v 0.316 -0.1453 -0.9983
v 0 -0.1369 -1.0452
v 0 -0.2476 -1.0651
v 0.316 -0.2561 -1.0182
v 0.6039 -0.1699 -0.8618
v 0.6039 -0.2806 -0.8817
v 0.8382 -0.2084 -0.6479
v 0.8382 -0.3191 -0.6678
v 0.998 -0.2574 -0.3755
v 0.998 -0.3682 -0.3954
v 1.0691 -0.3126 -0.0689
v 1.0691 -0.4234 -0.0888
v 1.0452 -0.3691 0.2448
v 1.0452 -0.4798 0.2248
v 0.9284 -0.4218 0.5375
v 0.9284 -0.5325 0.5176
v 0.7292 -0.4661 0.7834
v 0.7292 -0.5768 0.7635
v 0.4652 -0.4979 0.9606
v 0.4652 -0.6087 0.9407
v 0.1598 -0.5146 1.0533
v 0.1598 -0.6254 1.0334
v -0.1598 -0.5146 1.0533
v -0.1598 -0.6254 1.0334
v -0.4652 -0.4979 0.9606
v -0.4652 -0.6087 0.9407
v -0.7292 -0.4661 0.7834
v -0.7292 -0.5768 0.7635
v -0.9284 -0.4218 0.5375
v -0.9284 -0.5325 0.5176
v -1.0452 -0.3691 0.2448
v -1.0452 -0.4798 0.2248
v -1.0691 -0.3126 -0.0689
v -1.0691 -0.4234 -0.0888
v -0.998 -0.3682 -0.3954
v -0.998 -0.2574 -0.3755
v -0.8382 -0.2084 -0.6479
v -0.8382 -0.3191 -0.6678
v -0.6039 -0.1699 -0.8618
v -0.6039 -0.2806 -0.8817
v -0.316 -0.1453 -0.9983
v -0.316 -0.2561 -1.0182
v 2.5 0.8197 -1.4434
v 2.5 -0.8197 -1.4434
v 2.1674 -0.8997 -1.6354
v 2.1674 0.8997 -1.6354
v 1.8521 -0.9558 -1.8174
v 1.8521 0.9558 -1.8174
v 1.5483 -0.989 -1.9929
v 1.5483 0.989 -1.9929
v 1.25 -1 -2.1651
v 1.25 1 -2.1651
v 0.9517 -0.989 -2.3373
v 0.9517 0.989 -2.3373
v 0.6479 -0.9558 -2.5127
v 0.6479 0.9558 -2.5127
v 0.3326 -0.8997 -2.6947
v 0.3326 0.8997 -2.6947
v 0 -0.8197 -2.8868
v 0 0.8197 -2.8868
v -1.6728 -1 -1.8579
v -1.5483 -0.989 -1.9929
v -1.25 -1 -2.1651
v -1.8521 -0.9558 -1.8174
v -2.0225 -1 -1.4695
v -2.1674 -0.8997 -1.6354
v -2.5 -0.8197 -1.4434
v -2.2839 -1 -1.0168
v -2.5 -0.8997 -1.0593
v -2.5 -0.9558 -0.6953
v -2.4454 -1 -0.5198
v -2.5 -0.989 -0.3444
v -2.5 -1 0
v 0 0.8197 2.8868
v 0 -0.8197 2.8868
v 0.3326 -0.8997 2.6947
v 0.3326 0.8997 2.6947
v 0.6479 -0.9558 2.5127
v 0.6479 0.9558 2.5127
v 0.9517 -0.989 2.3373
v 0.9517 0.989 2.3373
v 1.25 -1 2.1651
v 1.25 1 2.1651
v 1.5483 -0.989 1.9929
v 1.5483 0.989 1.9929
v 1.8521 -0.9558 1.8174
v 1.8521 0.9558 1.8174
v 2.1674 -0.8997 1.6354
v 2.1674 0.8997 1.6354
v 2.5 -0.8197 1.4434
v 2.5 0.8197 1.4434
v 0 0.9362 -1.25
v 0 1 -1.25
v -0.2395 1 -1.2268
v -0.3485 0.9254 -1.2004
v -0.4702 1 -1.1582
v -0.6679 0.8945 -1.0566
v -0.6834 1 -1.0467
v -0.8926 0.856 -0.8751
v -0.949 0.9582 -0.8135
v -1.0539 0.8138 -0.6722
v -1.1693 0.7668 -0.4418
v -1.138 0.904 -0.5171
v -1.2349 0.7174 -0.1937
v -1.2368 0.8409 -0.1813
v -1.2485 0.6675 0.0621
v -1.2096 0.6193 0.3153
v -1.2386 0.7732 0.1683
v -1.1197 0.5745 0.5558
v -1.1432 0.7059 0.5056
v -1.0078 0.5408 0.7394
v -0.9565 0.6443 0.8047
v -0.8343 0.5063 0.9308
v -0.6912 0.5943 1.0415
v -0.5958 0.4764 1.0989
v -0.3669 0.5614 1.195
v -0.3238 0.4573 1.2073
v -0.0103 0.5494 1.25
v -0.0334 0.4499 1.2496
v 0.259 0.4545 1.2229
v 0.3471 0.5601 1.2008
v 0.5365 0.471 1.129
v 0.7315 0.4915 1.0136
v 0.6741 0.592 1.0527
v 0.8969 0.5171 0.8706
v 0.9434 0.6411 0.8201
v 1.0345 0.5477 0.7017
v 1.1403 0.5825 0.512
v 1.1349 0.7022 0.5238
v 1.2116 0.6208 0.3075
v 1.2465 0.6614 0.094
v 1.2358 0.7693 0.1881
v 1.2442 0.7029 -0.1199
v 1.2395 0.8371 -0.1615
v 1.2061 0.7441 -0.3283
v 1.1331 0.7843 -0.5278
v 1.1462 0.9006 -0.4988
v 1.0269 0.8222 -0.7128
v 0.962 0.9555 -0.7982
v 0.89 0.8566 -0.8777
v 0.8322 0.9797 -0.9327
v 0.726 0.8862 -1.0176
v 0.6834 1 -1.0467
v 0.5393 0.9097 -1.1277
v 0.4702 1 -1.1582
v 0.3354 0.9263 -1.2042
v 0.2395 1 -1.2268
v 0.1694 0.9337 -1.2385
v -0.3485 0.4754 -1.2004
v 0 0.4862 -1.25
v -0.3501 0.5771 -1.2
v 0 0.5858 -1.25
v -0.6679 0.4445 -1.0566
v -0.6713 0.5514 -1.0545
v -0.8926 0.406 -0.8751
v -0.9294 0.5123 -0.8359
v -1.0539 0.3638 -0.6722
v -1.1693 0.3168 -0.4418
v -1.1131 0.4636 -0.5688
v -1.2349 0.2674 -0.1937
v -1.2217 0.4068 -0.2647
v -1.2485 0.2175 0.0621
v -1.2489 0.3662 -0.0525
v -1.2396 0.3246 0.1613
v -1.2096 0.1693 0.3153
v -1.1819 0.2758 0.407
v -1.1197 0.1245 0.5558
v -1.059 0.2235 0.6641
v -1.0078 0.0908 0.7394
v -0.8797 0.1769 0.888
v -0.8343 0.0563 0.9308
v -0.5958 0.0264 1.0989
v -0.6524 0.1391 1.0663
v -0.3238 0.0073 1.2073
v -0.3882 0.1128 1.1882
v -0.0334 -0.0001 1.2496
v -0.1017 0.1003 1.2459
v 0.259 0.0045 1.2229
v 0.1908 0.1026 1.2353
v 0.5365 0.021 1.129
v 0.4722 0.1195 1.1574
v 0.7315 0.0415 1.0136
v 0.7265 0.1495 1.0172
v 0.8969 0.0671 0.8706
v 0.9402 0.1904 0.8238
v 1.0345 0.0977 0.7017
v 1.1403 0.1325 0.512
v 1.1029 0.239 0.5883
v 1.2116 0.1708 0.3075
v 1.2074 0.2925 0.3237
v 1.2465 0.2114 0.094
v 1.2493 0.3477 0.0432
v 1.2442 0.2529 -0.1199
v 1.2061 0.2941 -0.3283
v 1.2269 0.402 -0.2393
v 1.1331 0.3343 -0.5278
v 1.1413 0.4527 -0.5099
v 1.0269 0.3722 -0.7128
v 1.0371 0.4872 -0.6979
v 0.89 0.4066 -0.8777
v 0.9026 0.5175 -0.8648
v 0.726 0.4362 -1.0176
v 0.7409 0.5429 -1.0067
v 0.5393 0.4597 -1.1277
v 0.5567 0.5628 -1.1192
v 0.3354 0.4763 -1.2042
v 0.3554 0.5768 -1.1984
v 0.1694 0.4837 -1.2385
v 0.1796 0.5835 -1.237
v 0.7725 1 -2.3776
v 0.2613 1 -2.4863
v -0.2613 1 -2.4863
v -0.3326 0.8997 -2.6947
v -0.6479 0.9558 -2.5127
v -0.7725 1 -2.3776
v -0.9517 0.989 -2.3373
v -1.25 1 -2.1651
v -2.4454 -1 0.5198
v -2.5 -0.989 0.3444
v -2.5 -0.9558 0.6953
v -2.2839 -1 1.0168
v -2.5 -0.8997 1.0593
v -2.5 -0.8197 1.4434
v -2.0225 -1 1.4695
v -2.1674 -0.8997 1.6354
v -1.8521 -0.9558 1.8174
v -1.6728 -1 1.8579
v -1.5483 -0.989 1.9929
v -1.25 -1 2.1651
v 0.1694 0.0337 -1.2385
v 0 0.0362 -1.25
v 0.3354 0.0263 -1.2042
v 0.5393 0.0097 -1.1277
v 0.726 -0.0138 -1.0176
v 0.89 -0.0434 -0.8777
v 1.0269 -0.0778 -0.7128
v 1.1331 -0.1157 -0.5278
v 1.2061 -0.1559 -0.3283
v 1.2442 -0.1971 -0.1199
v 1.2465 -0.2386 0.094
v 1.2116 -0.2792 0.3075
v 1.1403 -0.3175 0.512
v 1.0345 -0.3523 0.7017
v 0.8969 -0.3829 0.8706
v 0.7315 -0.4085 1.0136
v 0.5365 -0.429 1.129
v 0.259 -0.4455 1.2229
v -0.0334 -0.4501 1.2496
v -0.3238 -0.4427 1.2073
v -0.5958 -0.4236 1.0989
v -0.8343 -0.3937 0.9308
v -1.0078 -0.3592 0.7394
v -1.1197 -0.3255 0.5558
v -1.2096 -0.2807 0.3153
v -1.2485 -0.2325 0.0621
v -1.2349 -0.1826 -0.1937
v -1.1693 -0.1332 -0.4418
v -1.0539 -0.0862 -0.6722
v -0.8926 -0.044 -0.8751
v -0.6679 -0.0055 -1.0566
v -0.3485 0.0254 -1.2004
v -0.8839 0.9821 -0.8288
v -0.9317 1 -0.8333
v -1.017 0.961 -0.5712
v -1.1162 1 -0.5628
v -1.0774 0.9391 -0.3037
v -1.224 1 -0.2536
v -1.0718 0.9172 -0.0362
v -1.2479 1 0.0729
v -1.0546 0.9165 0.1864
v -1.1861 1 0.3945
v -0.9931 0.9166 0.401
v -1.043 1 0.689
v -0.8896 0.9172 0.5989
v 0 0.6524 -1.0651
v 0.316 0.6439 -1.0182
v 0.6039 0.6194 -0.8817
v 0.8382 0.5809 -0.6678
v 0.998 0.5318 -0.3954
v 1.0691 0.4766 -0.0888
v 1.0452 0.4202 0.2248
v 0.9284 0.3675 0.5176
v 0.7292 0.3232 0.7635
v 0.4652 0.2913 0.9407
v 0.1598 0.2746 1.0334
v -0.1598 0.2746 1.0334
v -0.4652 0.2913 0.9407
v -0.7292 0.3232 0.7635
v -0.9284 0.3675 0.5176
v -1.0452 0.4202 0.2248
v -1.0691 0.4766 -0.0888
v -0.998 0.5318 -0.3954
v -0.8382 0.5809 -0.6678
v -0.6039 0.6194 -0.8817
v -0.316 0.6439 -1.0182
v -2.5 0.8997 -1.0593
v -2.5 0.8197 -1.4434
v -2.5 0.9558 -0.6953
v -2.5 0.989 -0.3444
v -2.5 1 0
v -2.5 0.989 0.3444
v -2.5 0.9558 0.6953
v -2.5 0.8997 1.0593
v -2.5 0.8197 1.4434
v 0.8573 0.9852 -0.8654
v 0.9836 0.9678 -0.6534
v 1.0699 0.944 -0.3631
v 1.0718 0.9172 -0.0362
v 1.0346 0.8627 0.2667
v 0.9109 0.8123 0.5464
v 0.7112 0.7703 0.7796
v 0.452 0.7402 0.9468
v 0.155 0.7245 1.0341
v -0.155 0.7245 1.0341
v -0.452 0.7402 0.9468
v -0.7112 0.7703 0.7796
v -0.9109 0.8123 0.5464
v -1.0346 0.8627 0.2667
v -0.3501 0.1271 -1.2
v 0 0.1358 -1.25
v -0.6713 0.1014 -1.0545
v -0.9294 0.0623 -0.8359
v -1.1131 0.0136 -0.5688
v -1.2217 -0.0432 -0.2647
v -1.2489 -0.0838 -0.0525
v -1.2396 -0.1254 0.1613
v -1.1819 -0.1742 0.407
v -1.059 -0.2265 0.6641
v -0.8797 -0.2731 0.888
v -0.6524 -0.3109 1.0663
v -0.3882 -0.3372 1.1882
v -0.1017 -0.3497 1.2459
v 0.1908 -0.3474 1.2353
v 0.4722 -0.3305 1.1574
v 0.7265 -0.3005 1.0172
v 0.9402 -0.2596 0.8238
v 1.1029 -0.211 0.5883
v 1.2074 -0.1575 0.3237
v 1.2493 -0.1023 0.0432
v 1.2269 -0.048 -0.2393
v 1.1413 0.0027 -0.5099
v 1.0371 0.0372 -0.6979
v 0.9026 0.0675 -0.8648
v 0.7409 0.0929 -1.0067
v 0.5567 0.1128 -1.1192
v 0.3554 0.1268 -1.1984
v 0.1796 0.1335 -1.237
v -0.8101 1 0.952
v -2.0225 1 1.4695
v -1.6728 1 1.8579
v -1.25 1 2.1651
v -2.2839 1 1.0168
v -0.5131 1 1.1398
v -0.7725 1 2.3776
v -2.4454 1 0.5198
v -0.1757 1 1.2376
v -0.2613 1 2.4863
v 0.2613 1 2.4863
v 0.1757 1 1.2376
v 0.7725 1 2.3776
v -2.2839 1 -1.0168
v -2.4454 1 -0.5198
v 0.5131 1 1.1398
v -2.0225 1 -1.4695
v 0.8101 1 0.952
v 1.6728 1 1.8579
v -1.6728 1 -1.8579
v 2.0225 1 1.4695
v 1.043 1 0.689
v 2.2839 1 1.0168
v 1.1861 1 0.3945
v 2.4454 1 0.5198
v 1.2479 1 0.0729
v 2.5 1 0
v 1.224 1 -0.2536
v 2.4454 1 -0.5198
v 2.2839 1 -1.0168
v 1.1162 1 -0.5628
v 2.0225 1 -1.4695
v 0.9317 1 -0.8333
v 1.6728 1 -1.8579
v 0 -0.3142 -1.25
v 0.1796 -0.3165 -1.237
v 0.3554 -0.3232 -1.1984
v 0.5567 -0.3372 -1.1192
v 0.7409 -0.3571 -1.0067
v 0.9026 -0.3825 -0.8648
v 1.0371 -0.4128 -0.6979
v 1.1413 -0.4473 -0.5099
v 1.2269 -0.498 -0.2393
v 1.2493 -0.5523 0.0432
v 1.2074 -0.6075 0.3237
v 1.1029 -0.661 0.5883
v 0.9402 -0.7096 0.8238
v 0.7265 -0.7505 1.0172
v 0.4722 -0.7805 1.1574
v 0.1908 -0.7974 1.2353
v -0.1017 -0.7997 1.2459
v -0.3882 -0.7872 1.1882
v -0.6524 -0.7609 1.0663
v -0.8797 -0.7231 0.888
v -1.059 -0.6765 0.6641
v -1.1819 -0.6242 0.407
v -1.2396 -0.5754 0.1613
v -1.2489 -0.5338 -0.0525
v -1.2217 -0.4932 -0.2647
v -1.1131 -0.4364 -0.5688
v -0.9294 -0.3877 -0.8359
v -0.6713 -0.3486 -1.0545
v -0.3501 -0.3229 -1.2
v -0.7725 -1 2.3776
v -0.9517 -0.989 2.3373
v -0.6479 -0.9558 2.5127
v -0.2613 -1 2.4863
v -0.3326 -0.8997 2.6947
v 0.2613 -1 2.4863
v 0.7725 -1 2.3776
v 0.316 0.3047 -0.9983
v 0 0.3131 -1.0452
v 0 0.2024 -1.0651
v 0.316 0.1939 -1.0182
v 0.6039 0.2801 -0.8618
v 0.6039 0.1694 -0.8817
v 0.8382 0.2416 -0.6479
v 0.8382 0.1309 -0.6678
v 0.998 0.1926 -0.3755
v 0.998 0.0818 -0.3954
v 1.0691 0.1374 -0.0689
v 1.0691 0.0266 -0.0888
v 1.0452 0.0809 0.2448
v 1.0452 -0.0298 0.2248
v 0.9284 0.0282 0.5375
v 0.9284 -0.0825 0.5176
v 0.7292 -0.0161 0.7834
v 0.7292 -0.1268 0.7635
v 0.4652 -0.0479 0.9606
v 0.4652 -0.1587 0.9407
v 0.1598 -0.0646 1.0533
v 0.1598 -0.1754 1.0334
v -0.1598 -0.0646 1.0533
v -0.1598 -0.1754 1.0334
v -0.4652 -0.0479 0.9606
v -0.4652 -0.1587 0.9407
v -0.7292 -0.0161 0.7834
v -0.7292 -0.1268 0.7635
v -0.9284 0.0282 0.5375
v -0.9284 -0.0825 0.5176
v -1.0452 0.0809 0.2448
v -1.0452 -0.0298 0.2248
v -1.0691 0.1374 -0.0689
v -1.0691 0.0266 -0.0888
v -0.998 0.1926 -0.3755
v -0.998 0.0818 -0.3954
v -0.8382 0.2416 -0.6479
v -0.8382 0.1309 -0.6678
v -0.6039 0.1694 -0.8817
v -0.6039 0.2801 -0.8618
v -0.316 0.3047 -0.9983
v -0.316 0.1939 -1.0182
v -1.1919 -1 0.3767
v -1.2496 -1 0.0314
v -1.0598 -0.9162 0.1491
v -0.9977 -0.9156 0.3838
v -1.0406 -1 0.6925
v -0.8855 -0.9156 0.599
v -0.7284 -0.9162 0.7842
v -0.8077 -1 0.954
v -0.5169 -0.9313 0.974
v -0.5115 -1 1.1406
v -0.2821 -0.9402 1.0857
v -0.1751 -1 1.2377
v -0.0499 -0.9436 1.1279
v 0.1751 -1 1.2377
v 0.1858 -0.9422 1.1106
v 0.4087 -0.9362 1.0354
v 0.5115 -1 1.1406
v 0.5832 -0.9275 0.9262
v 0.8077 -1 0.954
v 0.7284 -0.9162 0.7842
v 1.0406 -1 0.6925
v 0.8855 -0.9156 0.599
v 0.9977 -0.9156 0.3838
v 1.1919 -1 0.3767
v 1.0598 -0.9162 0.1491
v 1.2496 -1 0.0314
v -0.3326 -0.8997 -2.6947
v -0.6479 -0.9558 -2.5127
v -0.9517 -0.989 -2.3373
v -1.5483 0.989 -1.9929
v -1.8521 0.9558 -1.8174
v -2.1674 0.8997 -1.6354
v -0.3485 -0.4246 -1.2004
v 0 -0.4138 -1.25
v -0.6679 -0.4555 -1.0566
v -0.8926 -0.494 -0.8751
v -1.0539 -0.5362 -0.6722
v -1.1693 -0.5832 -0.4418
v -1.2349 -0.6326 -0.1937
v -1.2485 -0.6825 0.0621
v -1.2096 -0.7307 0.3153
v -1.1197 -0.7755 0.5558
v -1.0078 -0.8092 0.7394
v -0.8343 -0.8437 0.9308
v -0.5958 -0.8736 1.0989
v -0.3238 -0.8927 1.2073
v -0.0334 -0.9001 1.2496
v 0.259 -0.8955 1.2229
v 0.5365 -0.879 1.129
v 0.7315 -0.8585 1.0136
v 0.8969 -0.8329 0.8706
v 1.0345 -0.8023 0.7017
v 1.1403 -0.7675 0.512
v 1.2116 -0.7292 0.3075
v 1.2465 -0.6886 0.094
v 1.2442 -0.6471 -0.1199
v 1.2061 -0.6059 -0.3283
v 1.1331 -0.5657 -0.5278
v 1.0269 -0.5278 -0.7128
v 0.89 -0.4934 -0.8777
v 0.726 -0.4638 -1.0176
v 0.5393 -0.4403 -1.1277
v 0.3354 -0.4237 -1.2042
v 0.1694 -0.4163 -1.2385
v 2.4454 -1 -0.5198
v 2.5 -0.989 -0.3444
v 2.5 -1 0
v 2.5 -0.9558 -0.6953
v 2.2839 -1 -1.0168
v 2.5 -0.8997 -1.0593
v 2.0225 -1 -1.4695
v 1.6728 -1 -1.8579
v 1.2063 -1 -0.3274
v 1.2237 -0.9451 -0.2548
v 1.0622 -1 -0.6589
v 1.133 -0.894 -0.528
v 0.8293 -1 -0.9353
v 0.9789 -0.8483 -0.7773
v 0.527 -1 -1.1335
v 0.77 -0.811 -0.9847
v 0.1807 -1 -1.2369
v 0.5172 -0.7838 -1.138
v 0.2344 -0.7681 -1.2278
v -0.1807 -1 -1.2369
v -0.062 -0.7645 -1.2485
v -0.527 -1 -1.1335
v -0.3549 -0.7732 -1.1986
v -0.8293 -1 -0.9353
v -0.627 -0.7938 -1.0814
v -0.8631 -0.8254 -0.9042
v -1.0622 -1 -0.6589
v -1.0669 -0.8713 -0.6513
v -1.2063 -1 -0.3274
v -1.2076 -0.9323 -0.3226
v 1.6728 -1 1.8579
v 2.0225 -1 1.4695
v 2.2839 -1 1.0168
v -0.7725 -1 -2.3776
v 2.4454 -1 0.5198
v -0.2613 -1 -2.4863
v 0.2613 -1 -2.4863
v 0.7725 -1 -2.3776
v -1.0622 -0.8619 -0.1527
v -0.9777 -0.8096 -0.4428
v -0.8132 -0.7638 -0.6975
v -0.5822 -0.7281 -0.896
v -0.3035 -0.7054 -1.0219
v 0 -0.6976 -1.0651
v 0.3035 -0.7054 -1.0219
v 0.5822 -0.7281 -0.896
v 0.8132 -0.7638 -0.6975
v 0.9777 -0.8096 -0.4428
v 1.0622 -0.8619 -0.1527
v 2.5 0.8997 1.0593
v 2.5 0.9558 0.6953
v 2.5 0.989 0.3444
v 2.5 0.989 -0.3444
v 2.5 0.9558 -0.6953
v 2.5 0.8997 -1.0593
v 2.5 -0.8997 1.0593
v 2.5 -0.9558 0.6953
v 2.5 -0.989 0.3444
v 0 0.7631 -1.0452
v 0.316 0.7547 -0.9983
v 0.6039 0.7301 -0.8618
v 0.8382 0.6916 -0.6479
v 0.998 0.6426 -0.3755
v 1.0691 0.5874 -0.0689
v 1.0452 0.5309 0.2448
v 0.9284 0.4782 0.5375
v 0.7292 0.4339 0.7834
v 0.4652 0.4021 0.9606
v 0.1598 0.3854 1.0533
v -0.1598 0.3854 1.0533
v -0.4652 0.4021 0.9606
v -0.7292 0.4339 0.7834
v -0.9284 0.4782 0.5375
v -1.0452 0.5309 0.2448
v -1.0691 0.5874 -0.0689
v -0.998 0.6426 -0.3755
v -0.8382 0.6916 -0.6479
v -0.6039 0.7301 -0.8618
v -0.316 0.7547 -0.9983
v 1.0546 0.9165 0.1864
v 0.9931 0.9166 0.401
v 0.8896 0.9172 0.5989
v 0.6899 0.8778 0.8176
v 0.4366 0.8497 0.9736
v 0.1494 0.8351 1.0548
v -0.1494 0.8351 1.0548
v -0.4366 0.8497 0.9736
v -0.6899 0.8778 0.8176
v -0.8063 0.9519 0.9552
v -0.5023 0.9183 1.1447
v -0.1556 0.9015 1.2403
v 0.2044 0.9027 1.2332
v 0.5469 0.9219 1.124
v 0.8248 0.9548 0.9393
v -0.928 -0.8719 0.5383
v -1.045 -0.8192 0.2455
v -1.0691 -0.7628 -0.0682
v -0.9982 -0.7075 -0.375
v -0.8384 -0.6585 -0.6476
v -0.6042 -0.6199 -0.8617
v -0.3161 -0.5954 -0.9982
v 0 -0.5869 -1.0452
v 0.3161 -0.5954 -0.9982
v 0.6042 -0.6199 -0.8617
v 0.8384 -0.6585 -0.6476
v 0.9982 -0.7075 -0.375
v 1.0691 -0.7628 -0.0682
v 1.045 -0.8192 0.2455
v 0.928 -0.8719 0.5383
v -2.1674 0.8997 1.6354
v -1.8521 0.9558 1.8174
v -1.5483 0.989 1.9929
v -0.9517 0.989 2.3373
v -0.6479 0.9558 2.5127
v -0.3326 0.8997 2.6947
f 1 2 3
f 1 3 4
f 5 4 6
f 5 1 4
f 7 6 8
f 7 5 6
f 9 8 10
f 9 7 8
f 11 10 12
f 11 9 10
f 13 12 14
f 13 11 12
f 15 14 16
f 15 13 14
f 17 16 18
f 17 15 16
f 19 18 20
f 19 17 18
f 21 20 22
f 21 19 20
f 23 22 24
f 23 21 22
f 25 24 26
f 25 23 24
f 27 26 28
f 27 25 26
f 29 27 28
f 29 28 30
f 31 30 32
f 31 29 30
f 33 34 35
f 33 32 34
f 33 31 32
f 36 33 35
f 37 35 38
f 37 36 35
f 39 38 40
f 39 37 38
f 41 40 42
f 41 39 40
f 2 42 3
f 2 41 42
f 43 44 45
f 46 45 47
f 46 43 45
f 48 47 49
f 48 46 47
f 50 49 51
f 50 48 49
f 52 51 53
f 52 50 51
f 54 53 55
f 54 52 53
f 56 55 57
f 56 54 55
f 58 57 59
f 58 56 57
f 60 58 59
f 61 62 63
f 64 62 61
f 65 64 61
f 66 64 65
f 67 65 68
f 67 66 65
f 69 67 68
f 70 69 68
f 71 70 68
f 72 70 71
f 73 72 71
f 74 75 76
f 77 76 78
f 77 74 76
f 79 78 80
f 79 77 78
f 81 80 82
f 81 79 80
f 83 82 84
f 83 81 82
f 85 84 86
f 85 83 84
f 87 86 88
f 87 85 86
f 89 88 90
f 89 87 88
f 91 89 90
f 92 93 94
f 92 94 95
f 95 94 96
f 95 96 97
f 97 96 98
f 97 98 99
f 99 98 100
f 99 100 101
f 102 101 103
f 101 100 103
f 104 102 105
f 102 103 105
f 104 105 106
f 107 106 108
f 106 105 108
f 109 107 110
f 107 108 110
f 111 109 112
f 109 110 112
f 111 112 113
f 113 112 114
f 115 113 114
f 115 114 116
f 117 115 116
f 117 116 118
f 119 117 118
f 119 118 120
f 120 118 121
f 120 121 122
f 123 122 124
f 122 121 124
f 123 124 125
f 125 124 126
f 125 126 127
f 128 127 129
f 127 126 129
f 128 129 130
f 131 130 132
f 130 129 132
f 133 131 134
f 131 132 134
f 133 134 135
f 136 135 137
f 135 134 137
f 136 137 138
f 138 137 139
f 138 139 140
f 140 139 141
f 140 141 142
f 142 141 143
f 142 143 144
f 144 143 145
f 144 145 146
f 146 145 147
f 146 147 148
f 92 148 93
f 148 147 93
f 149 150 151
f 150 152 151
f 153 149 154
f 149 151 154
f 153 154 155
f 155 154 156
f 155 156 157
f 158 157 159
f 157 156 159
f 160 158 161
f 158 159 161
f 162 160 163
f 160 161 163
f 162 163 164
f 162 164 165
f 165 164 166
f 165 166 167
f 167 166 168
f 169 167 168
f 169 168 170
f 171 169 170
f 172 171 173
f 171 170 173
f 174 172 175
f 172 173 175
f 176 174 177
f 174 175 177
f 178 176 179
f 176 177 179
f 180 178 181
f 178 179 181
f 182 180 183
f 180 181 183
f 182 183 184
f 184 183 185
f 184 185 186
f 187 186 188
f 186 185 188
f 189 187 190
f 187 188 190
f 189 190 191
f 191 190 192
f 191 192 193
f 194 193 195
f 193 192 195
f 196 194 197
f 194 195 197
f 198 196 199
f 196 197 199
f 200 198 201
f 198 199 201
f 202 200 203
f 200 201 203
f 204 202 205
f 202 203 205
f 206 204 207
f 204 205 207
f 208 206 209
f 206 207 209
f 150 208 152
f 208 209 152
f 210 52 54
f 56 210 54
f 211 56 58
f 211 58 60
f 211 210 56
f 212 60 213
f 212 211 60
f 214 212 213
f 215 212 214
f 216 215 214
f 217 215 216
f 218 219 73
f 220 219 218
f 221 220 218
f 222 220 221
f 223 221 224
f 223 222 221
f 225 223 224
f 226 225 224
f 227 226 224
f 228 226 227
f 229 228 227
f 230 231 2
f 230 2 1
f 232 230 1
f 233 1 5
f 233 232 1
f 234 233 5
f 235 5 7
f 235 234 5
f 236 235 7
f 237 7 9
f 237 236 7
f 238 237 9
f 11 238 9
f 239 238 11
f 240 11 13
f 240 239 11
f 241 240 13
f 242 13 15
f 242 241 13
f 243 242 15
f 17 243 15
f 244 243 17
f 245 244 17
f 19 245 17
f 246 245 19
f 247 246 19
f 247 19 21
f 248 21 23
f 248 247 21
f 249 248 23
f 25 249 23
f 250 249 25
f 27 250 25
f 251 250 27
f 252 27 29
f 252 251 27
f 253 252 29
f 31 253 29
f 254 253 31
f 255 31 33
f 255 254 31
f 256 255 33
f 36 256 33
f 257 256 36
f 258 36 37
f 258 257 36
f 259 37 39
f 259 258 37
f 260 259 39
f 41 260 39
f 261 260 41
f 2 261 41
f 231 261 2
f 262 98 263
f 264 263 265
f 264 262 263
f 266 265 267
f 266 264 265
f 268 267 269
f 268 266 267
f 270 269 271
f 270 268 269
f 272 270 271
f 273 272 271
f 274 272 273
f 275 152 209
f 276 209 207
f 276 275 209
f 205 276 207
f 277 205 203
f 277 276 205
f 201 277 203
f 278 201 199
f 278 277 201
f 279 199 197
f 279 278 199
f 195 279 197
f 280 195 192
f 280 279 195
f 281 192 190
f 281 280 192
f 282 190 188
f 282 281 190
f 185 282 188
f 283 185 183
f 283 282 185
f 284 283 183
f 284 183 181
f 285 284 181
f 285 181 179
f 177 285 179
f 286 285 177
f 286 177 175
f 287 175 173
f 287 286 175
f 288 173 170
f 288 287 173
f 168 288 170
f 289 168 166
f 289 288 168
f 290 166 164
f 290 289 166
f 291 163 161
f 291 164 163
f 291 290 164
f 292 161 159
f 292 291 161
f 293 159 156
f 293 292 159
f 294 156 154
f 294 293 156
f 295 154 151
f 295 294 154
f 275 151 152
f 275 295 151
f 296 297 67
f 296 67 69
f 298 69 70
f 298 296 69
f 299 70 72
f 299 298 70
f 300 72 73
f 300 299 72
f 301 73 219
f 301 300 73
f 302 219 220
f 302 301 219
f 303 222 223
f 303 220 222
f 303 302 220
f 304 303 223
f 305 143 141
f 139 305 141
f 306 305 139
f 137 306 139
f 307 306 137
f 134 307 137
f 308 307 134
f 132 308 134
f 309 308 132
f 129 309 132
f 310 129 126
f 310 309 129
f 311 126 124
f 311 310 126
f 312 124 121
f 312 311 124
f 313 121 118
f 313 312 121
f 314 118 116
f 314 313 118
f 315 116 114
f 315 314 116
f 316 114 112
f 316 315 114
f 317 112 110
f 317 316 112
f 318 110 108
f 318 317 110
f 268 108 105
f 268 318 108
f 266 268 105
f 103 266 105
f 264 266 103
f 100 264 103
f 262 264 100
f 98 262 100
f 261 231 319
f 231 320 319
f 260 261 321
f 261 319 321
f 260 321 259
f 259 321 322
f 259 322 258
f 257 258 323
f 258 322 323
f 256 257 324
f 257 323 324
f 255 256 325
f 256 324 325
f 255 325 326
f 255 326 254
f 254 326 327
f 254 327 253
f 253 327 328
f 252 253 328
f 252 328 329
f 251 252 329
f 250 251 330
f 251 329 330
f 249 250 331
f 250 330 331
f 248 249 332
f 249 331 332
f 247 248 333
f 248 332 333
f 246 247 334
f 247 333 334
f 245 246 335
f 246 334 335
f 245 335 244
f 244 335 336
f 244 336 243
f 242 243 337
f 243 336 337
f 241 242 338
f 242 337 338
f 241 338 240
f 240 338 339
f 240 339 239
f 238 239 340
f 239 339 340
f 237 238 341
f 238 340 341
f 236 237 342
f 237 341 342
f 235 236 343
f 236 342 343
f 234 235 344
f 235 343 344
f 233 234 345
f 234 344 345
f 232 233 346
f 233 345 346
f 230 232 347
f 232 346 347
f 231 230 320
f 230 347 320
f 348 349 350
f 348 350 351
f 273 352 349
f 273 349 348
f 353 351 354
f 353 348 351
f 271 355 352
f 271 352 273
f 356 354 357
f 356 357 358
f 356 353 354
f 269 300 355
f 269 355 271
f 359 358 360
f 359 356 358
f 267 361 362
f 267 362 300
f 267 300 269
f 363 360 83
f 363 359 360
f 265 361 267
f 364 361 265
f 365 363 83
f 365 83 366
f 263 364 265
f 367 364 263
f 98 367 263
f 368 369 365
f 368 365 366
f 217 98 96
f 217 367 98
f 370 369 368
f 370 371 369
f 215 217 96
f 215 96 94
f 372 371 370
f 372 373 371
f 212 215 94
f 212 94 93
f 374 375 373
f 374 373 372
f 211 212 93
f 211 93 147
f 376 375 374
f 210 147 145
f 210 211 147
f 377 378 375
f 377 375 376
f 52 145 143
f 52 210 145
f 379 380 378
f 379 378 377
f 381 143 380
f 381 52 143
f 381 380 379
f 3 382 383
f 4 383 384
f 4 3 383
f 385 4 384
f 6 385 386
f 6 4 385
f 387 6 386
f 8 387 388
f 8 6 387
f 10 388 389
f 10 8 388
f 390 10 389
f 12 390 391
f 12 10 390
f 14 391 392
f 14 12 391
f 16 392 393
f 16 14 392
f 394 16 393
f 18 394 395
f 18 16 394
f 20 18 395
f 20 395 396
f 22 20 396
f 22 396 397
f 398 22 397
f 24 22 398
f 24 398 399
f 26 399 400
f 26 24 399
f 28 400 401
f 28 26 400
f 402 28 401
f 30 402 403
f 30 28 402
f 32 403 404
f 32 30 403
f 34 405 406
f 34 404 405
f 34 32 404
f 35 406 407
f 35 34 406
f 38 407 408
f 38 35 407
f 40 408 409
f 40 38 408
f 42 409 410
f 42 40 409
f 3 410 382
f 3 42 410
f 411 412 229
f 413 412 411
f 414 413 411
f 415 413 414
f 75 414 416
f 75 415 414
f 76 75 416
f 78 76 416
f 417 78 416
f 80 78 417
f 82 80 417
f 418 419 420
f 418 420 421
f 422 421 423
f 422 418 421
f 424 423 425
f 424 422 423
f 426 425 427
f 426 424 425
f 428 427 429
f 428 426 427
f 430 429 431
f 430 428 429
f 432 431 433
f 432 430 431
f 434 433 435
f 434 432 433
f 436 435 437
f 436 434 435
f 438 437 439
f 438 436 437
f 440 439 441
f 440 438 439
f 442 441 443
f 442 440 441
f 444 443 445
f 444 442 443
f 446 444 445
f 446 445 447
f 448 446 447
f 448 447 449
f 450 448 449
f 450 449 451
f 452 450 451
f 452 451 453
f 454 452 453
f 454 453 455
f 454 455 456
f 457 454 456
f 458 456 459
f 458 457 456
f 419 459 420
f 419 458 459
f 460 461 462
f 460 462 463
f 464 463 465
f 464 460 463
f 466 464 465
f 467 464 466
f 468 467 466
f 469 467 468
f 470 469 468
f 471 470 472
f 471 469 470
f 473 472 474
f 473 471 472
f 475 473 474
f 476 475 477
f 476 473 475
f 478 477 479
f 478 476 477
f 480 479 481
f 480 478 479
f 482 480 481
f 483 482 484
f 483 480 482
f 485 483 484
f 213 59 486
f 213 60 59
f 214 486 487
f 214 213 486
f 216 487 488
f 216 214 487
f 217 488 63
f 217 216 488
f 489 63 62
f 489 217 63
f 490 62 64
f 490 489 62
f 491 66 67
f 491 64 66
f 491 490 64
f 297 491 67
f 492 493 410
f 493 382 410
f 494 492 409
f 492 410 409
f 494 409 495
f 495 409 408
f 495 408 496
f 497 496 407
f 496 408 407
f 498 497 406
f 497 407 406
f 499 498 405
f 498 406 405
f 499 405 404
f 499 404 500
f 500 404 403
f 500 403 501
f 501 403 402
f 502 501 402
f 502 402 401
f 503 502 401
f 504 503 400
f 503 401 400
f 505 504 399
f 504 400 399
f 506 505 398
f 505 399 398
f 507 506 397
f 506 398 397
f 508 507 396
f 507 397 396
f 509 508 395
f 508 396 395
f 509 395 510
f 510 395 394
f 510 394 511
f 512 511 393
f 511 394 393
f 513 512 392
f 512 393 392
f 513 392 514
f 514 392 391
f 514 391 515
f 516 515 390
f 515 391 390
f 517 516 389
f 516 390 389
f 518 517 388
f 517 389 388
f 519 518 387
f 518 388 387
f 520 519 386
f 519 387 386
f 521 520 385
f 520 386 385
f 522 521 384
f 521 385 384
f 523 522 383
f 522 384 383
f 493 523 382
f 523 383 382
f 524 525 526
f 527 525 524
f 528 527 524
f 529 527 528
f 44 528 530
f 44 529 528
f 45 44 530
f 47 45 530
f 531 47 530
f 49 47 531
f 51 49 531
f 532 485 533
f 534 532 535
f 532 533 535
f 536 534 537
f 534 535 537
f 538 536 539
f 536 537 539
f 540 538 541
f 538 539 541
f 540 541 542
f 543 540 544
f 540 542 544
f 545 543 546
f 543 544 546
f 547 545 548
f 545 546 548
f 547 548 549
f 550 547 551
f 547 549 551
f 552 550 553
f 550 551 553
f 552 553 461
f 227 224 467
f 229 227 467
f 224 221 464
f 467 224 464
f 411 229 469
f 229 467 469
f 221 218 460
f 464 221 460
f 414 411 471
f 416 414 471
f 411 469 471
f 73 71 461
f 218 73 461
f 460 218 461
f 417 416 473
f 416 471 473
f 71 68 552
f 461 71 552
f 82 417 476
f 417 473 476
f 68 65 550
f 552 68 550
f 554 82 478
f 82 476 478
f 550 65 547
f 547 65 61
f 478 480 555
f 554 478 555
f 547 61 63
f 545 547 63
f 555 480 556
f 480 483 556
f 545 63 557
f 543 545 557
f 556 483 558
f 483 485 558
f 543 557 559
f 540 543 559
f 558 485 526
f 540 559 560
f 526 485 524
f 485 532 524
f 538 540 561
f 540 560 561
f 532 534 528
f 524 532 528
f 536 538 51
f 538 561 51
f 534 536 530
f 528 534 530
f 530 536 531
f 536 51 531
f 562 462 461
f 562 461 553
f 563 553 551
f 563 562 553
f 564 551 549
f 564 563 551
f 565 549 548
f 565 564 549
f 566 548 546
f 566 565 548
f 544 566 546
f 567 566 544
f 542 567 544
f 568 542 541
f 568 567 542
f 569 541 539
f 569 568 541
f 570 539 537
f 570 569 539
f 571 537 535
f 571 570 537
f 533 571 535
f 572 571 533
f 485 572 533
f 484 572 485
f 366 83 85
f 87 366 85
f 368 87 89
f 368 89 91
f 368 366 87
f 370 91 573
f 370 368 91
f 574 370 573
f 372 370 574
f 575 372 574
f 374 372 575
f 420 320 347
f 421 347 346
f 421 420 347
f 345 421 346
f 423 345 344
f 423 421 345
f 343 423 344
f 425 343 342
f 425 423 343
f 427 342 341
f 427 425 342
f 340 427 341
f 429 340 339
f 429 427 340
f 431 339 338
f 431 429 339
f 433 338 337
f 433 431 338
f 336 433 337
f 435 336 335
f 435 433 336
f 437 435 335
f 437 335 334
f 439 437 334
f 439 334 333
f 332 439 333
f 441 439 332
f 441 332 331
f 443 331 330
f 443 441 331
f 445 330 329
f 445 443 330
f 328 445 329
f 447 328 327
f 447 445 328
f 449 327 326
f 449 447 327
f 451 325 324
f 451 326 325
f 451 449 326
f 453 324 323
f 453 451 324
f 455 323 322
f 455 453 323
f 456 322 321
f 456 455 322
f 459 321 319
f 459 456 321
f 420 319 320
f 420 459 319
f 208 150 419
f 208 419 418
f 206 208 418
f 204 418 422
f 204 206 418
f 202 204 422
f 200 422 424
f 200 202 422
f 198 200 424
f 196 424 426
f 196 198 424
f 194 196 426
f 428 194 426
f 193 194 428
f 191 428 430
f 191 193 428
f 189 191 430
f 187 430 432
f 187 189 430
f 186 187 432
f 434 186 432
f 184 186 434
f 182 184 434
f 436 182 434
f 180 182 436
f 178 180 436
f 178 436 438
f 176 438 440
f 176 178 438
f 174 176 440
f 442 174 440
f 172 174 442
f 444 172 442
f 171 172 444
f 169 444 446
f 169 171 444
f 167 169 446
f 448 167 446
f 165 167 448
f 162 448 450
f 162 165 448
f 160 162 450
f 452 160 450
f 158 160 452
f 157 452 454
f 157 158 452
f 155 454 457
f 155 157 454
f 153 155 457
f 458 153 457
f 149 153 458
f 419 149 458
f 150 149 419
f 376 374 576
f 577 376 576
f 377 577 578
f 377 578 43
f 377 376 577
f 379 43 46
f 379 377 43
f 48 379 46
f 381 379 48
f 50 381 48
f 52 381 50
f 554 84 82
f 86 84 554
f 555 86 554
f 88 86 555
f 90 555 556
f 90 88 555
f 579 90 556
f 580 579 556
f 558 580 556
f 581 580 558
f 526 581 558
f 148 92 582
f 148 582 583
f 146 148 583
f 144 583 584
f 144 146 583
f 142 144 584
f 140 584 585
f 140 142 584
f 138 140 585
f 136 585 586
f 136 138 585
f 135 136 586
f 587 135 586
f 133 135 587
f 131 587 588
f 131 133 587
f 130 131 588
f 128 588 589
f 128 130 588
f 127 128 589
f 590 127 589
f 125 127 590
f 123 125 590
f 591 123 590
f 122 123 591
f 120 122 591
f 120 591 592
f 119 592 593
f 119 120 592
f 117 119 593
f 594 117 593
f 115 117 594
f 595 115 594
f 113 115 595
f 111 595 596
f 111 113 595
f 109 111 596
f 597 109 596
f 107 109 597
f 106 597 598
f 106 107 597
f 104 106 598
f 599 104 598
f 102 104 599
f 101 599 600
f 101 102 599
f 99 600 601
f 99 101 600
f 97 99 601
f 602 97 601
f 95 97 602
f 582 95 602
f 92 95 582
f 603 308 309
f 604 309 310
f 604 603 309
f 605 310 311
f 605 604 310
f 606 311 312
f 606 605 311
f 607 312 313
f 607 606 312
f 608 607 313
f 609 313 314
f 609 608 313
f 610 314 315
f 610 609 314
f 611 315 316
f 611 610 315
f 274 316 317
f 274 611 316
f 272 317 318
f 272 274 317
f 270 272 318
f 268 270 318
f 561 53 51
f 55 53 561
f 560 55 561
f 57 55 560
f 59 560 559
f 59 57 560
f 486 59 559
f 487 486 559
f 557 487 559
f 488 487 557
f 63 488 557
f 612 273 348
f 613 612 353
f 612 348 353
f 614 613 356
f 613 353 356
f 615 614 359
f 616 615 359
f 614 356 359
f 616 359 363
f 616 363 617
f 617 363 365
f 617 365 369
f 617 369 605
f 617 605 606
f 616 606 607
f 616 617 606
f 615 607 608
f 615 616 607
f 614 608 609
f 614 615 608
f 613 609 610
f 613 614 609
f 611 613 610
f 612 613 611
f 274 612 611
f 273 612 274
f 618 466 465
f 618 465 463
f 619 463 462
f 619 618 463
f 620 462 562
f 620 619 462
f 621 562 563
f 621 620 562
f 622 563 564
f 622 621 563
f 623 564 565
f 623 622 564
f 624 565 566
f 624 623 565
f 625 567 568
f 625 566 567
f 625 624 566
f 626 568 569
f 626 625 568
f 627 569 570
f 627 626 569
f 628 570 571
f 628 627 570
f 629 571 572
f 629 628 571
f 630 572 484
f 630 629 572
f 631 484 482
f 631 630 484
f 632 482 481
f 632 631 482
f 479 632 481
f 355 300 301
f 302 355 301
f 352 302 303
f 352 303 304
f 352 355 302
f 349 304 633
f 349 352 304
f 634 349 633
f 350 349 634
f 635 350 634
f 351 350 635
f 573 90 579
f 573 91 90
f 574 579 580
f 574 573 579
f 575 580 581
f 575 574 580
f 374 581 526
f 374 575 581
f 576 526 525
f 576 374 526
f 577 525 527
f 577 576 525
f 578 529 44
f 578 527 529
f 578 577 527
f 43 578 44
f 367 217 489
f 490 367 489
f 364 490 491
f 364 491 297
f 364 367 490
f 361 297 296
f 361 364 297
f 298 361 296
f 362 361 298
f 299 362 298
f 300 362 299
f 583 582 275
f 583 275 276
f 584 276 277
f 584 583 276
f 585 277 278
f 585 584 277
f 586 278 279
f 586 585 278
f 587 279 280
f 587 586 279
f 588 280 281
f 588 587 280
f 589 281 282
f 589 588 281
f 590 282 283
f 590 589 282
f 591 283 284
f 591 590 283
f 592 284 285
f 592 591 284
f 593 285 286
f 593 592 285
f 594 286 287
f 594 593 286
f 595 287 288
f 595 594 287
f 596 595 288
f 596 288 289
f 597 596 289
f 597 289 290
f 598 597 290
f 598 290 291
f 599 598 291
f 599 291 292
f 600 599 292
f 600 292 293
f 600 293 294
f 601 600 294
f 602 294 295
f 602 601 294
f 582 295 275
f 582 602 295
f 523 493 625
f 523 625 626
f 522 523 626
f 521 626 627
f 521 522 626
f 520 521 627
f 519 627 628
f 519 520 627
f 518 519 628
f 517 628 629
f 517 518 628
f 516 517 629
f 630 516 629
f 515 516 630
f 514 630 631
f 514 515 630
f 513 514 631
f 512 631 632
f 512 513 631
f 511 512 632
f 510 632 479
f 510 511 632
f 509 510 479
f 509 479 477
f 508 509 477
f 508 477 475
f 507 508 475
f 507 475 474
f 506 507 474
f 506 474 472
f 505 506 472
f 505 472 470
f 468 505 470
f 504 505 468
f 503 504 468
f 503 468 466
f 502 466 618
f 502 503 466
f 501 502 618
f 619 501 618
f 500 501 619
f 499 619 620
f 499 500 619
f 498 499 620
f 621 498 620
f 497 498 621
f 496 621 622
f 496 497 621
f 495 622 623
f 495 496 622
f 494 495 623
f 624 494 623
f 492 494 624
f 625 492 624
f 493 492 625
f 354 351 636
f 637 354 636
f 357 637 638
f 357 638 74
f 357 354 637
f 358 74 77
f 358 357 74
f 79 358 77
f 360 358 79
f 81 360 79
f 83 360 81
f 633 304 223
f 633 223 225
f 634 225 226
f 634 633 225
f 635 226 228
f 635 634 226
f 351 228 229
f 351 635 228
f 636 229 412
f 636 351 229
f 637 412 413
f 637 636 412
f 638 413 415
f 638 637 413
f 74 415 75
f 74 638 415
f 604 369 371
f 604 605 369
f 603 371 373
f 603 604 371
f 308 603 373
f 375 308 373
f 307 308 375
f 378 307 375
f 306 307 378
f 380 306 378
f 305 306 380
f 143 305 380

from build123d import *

# Parameters (mm, degrees)
EXTRUDE1_DEPTH      = 1
SKETCH2_W           = 1.25
SKETCH2_H           = 2
LPATTERN1_COUNT     = 4
LPATTERN1_PITCH     = 0.45
LPATTERN1_COL_COUNT = 2
LPATTERN1_COL_PITCH = 0.45


with BuildPart() as part:
    # Sketch1 → Extrude1 (new body, symmetric)
    with BuildSketch(Plane(origin=(0, 0, 0), x_dir=(1, 0, 0), z_dir=(0, 1, 0))):
        Polygon((0, 2.886751346), (-2.5, 1.443375673), (-2.5, -1.443375673), (0, -2.886751346), (2.5, -1.443375673), (2.5, 1.443375673), align=None)
    extrude(amount=EXTRUDE1_DEPTH, both=True)

    # Sketch4 → Cut-Revolve2 (revolve, cut)
    with BuildSketch(Plane(origin=(0, 0, 0), x_dir=(0, 0, -1), z_dir=(1, 0, 0))):
        Polygon((0, 1), (1.25, 1), (1.045159814, 0.904481453), (1.045159814, -0.904481453), (1.25, -1), (0, -1), align=None)
    revolve(axis=Axis((0, 1, 0), (0, 1, 0)), mode=Mode.SUBTRACT)


with BuildPart() as body_2:
    # Sketch2 → Revolve1 (revolve)
    with BuildSketch(Plane(origin=(0, 0, 0), x_dir=(0, 0, -1), z_dir=(1, 0, 0))):
        with Locations((0.625, 0)):
            Rectangle(SKETCH2_W, SKETCH2_H)
    revolve(axis=Axis((0, -2.25, 0), (0, 1, 0)))

    # Sketch3 → Cut-Revolve1 (revolve, cut)
    with BuildSketch(Plane(origin=(0, 0, 0), x_dir=(0, 0, -1), z_dir=(1, 0, 0))):
        Polygon((1.259964856, 0.944639688), (1.329718849, 0.557117504), (1.065089526, 0.652369191), (1.045159814, 0.763089815), align=None)
    cut_revolve1 = revolve(axis=Axis((0, 1, 0.086794729), (0, -0.984183324, -0.177152998)), mode=Mode.SUBTRACT)

    # LPattern1: Cut-Revolve1 ×4
    with Locations(*[(0, -i * LPATTERN1_PITCH, 0) for i in range(1, LPATTERN1_COUNT)]):
        add(cut_revolve1, mode=Mode.SUBTRACT)

    # LPattern1 col: Cut-Revolve1 ×2
    with Locations(*[(0, i * LPATTERN1_COL_PITCH, 0) for i in range(1, LPATTERN1_COL_COUNT)]):
        add(cut_revolve1, mode=Mode.SUBTRACT)


with BuildPart() as part_1:
    add(part.part)

    # Combine1: cut body 2
    add(body_2.part, mode=Mode.SUBTRACT)

    # Sketch5 → Cut-Revolve3 (revolve, cut)
    with BuildSketch(Plane(origin=(0, 0, 0), x_dir=(0, 0, -1), z_dir=(1, 0, 0))):
        Polygon((0, -1), (2.5, -1), (2.886751346, -0.819654886), (2.886751346, 0.819654886), (2.5, 1), (0, 1), (0, 2.27), (4.156751346, 2.27), (4.156751346, -2.27), (0, -2.27), align=None)
    revolve(axis=Axis((0, -1, 0), (0, 1, 0)), mode=Mode.SUBTRACT)


solid = part_1.part
